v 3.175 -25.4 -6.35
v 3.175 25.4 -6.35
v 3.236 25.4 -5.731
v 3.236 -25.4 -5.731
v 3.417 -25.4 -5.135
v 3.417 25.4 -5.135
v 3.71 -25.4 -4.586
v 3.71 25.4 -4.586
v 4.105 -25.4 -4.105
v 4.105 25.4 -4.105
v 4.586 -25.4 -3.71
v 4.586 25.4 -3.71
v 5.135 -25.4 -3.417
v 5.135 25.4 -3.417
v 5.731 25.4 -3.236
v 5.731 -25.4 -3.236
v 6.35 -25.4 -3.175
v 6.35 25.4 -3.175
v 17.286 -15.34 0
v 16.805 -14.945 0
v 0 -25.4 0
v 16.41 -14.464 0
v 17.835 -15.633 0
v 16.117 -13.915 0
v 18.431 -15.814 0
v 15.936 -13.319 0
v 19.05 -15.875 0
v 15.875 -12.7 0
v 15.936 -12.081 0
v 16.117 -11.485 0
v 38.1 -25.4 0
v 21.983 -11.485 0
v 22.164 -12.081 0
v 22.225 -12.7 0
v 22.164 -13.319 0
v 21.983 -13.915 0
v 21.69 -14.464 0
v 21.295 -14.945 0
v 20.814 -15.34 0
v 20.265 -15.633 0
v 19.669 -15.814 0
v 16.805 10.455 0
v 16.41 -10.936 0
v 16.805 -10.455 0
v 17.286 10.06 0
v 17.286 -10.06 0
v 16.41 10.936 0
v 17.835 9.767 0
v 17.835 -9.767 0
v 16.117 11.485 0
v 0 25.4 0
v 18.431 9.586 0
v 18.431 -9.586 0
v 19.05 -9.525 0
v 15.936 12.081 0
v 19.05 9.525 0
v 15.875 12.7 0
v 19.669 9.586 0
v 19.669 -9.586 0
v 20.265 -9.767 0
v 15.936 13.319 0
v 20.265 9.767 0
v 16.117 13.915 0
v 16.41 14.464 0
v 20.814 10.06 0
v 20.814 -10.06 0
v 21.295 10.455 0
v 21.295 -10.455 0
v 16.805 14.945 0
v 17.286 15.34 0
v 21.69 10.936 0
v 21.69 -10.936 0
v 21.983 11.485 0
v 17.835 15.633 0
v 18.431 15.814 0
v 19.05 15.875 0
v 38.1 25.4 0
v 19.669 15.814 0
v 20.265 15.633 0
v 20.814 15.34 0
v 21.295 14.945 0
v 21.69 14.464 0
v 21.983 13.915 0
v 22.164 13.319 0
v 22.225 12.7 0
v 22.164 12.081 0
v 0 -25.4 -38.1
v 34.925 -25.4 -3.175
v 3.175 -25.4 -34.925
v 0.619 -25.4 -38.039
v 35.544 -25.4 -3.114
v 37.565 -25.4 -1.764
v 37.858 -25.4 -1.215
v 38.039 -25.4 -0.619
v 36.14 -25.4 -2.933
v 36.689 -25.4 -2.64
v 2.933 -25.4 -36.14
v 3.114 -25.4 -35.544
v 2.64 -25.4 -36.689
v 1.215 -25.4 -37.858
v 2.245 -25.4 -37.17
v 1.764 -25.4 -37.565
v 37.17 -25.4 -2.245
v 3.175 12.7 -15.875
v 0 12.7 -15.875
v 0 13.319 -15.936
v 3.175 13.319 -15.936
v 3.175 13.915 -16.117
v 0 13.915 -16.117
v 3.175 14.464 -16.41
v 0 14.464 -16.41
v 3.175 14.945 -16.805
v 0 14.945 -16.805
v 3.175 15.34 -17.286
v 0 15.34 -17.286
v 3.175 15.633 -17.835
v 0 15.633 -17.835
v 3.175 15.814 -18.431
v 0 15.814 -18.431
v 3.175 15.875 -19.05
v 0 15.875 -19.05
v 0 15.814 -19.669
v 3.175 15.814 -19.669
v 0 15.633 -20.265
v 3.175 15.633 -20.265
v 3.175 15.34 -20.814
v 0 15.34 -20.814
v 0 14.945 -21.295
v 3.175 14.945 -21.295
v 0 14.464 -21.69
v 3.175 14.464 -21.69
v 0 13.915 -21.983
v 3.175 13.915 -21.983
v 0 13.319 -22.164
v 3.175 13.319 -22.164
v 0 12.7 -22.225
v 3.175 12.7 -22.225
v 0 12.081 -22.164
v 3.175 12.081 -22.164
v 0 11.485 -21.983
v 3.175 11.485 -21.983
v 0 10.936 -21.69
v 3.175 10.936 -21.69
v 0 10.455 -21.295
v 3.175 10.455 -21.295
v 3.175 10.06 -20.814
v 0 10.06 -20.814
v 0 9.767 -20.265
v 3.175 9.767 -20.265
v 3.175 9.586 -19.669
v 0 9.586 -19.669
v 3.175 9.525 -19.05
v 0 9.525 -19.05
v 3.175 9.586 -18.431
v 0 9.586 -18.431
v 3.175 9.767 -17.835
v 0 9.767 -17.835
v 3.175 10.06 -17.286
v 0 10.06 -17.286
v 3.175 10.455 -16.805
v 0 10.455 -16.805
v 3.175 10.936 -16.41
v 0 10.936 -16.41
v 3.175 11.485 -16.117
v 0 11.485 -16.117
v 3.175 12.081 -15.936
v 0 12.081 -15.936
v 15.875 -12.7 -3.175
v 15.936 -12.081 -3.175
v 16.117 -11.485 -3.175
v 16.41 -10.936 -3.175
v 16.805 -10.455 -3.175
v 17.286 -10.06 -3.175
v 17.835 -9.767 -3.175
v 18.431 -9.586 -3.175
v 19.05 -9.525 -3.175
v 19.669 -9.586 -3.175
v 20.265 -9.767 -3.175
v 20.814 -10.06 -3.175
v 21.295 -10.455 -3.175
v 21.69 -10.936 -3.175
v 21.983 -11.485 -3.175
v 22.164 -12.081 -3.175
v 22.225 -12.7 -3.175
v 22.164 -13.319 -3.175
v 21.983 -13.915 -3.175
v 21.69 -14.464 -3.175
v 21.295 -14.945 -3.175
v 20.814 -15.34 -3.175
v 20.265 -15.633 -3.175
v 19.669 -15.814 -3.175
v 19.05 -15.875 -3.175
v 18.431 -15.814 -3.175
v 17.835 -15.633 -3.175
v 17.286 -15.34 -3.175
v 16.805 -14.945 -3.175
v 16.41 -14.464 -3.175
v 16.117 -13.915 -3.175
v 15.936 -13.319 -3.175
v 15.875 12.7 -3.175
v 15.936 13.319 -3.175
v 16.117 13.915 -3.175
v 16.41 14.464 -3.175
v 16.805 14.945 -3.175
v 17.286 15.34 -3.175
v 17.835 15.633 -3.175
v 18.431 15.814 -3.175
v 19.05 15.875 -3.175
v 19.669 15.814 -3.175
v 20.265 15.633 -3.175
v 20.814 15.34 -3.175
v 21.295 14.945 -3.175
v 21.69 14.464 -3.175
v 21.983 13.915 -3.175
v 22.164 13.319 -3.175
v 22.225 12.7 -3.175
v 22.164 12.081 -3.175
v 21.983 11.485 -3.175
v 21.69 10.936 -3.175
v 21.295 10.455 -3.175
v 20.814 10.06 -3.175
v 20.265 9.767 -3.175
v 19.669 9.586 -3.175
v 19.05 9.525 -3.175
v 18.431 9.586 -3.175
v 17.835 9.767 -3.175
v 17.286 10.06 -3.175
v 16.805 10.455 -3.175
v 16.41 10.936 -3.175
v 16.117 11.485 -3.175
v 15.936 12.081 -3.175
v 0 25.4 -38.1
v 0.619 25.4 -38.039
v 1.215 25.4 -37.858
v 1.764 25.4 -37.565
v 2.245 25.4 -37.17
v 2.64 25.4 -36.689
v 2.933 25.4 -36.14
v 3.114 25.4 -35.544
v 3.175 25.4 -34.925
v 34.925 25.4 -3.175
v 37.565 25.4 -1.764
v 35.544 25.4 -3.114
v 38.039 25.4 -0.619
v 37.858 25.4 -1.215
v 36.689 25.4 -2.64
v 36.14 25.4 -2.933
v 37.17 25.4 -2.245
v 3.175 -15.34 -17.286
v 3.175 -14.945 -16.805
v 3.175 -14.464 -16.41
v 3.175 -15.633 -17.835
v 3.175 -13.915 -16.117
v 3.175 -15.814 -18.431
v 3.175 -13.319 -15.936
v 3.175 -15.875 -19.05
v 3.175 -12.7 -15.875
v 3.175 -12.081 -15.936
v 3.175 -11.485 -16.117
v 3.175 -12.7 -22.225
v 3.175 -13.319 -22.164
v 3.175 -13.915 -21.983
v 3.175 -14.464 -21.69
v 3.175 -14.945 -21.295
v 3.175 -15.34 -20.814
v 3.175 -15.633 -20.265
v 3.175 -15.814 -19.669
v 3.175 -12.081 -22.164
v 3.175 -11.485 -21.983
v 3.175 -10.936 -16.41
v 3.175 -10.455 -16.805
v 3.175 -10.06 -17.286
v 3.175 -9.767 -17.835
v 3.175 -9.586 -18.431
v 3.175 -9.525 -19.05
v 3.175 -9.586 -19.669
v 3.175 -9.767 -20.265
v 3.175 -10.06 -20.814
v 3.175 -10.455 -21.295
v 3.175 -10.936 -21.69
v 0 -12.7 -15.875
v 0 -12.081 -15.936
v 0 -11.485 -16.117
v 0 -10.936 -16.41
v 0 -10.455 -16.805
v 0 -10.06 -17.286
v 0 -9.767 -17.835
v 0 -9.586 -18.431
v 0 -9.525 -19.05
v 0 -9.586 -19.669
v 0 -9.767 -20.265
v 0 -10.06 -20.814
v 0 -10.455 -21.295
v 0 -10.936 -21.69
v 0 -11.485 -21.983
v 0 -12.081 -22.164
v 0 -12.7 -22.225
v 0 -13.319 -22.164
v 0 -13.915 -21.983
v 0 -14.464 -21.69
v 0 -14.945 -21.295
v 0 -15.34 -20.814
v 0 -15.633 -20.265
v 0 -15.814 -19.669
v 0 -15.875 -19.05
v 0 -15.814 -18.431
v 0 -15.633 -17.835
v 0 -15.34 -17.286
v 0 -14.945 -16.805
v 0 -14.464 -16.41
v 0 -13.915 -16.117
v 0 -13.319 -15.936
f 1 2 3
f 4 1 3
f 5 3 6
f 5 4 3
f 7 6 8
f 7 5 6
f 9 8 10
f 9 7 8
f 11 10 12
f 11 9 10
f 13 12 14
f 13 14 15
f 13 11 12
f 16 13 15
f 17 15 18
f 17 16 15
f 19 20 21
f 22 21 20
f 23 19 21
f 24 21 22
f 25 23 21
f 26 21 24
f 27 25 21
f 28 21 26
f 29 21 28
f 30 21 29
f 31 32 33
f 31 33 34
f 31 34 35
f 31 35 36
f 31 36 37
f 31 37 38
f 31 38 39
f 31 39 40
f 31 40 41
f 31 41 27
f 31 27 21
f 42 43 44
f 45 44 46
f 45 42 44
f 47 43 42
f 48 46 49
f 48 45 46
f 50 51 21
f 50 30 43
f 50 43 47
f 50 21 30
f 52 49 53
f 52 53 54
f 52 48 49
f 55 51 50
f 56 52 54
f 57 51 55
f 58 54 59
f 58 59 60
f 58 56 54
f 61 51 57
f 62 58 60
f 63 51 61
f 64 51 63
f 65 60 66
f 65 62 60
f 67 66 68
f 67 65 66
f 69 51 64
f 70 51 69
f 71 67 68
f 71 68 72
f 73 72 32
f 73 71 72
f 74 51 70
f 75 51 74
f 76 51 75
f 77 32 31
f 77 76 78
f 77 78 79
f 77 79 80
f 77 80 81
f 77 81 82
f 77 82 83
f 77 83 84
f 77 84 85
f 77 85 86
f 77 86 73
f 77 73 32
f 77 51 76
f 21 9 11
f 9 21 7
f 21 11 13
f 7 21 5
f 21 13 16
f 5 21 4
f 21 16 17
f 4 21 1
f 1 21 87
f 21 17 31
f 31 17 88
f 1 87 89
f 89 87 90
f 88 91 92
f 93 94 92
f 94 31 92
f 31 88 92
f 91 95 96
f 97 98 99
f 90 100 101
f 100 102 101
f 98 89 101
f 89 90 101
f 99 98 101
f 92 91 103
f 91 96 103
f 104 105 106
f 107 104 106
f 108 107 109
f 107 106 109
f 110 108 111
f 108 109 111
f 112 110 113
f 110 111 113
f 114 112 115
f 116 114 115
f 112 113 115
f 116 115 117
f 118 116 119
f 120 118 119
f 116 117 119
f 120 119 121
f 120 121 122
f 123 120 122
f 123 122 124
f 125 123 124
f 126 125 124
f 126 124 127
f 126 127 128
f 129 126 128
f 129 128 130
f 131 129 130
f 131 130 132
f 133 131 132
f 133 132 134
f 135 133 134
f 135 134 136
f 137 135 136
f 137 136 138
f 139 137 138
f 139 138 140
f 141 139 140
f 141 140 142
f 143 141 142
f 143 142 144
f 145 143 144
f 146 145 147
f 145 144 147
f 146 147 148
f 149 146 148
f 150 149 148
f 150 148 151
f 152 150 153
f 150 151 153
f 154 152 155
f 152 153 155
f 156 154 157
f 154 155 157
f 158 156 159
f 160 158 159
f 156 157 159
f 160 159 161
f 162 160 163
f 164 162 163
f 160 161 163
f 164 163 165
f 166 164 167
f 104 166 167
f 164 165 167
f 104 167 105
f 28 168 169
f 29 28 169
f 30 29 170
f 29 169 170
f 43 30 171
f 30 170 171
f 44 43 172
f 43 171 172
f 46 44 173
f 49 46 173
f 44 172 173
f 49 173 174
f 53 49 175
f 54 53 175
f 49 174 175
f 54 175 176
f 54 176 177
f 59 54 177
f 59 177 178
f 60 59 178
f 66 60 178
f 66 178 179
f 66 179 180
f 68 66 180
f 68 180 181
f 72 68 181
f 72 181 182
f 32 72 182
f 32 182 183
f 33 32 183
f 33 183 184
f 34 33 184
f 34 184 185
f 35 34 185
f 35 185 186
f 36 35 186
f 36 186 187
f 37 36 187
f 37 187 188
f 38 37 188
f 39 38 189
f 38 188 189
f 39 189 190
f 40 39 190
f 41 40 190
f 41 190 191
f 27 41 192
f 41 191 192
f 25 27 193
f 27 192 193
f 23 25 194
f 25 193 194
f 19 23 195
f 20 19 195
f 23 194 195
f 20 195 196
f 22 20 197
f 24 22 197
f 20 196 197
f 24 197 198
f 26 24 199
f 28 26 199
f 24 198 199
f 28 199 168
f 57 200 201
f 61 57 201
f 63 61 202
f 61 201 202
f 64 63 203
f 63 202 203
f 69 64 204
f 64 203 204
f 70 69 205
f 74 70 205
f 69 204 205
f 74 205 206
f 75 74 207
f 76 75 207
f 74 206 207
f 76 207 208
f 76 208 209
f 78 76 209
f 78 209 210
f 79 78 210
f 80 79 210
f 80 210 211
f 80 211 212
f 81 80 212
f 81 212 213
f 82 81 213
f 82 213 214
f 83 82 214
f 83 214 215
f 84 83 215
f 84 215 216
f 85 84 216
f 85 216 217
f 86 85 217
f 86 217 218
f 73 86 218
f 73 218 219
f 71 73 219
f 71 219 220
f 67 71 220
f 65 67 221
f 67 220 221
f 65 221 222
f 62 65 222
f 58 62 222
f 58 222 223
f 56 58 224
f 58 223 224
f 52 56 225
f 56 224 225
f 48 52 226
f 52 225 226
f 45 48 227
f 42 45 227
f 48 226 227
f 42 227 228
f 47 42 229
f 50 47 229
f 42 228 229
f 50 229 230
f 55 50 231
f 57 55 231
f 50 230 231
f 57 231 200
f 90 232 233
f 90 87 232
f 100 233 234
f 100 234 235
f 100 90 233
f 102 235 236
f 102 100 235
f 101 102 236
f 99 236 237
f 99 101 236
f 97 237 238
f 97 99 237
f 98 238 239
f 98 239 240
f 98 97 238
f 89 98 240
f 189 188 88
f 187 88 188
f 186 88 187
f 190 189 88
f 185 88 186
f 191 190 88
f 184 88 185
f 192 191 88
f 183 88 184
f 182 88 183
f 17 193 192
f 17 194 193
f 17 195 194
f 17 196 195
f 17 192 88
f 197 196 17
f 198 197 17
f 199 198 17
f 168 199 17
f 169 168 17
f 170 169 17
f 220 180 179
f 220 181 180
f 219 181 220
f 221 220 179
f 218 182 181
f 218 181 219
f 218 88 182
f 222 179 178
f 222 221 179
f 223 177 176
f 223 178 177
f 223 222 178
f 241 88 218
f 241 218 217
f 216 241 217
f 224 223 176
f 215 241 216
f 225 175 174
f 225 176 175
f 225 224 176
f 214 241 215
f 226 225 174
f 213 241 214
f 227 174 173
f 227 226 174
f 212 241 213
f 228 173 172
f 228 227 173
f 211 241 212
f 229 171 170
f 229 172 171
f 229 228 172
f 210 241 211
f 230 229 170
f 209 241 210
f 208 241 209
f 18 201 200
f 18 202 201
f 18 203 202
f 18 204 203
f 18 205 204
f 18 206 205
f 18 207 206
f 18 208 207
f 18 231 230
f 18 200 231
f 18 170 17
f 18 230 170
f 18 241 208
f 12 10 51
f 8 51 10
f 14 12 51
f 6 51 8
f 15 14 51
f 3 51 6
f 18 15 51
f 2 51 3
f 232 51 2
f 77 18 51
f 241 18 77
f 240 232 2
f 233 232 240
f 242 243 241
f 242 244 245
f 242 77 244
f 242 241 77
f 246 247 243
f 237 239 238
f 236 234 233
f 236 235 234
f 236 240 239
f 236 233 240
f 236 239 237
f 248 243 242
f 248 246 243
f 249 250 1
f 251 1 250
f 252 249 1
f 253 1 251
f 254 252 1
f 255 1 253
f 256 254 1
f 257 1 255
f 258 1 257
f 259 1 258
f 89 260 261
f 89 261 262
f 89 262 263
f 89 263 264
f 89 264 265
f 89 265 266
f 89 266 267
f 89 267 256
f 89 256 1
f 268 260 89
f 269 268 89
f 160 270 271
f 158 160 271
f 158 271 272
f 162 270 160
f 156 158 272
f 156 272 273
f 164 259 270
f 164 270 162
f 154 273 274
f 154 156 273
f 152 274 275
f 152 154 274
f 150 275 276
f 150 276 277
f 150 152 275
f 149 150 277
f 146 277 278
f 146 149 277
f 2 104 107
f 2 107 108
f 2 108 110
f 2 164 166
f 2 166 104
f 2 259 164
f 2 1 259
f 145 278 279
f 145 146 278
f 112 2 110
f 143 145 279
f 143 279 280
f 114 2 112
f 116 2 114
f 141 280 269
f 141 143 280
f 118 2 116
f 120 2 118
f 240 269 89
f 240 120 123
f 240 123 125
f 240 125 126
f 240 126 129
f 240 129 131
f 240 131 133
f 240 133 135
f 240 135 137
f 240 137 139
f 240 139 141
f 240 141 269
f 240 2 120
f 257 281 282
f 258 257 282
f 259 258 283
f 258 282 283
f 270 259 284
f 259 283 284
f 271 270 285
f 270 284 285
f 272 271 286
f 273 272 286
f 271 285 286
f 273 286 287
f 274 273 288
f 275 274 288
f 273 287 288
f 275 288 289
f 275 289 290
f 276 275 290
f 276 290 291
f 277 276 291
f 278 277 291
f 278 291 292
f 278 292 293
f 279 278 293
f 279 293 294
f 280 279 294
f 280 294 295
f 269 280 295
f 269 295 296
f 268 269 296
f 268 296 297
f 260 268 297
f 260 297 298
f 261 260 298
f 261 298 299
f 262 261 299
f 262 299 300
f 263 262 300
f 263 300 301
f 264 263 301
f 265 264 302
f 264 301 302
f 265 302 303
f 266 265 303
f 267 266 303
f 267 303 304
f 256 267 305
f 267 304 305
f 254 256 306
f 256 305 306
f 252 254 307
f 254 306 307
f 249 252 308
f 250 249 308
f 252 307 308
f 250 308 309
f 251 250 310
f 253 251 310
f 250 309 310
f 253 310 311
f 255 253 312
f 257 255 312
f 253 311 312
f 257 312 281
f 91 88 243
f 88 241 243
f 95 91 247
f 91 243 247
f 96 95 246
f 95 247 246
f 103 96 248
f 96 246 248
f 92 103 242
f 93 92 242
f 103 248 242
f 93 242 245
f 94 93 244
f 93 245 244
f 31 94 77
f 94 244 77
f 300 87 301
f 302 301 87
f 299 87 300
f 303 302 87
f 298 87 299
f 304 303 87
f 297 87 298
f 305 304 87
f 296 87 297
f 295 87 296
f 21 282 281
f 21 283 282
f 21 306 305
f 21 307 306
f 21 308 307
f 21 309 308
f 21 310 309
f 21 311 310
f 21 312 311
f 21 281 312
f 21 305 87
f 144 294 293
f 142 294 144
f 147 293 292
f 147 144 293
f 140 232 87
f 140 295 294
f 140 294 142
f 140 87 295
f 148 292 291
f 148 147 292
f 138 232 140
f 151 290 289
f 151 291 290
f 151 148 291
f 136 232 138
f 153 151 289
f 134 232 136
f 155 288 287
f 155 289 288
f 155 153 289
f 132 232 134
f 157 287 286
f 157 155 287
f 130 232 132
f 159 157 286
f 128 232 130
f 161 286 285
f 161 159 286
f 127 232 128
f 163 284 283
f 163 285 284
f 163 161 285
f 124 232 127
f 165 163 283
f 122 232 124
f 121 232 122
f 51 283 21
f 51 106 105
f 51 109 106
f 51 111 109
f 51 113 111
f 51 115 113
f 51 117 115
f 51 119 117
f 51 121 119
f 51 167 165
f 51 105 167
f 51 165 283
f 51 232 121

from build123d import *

# Parameters (mm, degrees)
EXTRUDE_THIN1_DEPTH = 25.4
FILLET1_R           = 3.175
SKETCH2_R           = 3.175
CUT_EXTRUDE1_DEPTH  = 58.589283942
SKETCH3_R           = 3.175
CUT_EXTRUDE2_DEPTH  = 60.56828015


with BuildPart() as part:
    # Sketch1 → Extrude-Thin1 (new, symmetric)
    with BuildSketch(Plane(origin=(0, 0, 0), x_dir=(1, 0, 0), z_dir=(0, 1, 0))):
        Polygon((0, 38.1), (0, 0), (38.1, 0), (38.1, 3.175), (3.175, 3.175), (3.175, 38.1), align=None)
    extrude(amount=EXTRUDE_THIN1_DEPTH, both=True)

    # Fillet1
    fillet1_edges = [part.edges().sort_by_distance(p)[0] for p in [
        (3.175, 0, -3.175),
        (38.1, 0, -3.175),
        (3.175, 0, -38.1),
    ]]
    fillet(fillet1_edges, radius=FILLET1_R - 0.0001)  # a hair under: the kernel refuses the full size

    # Sketch2 → Cut-Extrude1 (cut, through all)
    with BuildSketch(Plane(origin=(0, 0, -3.175), x_dir=(-1, 0, 0), z_dir=(0, 0, -1))):
        with Locations((-19.05, 12.7)):
            Circle(SKETCH2_R)
        with Locations((-19.05, -12.7)):
            Circle(SKETCH2_R)
    extrude(amount=-CUT_EXTRUDE1_DEPTH, mode=Mode.SUBTRACT)

    # Sketch3 → Cut-Extrude2 (cut, through all)
    with BuildSketch(Plane.ZY):
        with Locations((-19.05, 12.7)):
            Circle(SKETCH3_R)
        with Locations((-19.05, -12.7)):
            Circle(SKETCH3_R)
    extrude(amount=-CUT_EXTRUDE2_DEPTH, mode=Mode.SUBTRACT)


solid = part.part
